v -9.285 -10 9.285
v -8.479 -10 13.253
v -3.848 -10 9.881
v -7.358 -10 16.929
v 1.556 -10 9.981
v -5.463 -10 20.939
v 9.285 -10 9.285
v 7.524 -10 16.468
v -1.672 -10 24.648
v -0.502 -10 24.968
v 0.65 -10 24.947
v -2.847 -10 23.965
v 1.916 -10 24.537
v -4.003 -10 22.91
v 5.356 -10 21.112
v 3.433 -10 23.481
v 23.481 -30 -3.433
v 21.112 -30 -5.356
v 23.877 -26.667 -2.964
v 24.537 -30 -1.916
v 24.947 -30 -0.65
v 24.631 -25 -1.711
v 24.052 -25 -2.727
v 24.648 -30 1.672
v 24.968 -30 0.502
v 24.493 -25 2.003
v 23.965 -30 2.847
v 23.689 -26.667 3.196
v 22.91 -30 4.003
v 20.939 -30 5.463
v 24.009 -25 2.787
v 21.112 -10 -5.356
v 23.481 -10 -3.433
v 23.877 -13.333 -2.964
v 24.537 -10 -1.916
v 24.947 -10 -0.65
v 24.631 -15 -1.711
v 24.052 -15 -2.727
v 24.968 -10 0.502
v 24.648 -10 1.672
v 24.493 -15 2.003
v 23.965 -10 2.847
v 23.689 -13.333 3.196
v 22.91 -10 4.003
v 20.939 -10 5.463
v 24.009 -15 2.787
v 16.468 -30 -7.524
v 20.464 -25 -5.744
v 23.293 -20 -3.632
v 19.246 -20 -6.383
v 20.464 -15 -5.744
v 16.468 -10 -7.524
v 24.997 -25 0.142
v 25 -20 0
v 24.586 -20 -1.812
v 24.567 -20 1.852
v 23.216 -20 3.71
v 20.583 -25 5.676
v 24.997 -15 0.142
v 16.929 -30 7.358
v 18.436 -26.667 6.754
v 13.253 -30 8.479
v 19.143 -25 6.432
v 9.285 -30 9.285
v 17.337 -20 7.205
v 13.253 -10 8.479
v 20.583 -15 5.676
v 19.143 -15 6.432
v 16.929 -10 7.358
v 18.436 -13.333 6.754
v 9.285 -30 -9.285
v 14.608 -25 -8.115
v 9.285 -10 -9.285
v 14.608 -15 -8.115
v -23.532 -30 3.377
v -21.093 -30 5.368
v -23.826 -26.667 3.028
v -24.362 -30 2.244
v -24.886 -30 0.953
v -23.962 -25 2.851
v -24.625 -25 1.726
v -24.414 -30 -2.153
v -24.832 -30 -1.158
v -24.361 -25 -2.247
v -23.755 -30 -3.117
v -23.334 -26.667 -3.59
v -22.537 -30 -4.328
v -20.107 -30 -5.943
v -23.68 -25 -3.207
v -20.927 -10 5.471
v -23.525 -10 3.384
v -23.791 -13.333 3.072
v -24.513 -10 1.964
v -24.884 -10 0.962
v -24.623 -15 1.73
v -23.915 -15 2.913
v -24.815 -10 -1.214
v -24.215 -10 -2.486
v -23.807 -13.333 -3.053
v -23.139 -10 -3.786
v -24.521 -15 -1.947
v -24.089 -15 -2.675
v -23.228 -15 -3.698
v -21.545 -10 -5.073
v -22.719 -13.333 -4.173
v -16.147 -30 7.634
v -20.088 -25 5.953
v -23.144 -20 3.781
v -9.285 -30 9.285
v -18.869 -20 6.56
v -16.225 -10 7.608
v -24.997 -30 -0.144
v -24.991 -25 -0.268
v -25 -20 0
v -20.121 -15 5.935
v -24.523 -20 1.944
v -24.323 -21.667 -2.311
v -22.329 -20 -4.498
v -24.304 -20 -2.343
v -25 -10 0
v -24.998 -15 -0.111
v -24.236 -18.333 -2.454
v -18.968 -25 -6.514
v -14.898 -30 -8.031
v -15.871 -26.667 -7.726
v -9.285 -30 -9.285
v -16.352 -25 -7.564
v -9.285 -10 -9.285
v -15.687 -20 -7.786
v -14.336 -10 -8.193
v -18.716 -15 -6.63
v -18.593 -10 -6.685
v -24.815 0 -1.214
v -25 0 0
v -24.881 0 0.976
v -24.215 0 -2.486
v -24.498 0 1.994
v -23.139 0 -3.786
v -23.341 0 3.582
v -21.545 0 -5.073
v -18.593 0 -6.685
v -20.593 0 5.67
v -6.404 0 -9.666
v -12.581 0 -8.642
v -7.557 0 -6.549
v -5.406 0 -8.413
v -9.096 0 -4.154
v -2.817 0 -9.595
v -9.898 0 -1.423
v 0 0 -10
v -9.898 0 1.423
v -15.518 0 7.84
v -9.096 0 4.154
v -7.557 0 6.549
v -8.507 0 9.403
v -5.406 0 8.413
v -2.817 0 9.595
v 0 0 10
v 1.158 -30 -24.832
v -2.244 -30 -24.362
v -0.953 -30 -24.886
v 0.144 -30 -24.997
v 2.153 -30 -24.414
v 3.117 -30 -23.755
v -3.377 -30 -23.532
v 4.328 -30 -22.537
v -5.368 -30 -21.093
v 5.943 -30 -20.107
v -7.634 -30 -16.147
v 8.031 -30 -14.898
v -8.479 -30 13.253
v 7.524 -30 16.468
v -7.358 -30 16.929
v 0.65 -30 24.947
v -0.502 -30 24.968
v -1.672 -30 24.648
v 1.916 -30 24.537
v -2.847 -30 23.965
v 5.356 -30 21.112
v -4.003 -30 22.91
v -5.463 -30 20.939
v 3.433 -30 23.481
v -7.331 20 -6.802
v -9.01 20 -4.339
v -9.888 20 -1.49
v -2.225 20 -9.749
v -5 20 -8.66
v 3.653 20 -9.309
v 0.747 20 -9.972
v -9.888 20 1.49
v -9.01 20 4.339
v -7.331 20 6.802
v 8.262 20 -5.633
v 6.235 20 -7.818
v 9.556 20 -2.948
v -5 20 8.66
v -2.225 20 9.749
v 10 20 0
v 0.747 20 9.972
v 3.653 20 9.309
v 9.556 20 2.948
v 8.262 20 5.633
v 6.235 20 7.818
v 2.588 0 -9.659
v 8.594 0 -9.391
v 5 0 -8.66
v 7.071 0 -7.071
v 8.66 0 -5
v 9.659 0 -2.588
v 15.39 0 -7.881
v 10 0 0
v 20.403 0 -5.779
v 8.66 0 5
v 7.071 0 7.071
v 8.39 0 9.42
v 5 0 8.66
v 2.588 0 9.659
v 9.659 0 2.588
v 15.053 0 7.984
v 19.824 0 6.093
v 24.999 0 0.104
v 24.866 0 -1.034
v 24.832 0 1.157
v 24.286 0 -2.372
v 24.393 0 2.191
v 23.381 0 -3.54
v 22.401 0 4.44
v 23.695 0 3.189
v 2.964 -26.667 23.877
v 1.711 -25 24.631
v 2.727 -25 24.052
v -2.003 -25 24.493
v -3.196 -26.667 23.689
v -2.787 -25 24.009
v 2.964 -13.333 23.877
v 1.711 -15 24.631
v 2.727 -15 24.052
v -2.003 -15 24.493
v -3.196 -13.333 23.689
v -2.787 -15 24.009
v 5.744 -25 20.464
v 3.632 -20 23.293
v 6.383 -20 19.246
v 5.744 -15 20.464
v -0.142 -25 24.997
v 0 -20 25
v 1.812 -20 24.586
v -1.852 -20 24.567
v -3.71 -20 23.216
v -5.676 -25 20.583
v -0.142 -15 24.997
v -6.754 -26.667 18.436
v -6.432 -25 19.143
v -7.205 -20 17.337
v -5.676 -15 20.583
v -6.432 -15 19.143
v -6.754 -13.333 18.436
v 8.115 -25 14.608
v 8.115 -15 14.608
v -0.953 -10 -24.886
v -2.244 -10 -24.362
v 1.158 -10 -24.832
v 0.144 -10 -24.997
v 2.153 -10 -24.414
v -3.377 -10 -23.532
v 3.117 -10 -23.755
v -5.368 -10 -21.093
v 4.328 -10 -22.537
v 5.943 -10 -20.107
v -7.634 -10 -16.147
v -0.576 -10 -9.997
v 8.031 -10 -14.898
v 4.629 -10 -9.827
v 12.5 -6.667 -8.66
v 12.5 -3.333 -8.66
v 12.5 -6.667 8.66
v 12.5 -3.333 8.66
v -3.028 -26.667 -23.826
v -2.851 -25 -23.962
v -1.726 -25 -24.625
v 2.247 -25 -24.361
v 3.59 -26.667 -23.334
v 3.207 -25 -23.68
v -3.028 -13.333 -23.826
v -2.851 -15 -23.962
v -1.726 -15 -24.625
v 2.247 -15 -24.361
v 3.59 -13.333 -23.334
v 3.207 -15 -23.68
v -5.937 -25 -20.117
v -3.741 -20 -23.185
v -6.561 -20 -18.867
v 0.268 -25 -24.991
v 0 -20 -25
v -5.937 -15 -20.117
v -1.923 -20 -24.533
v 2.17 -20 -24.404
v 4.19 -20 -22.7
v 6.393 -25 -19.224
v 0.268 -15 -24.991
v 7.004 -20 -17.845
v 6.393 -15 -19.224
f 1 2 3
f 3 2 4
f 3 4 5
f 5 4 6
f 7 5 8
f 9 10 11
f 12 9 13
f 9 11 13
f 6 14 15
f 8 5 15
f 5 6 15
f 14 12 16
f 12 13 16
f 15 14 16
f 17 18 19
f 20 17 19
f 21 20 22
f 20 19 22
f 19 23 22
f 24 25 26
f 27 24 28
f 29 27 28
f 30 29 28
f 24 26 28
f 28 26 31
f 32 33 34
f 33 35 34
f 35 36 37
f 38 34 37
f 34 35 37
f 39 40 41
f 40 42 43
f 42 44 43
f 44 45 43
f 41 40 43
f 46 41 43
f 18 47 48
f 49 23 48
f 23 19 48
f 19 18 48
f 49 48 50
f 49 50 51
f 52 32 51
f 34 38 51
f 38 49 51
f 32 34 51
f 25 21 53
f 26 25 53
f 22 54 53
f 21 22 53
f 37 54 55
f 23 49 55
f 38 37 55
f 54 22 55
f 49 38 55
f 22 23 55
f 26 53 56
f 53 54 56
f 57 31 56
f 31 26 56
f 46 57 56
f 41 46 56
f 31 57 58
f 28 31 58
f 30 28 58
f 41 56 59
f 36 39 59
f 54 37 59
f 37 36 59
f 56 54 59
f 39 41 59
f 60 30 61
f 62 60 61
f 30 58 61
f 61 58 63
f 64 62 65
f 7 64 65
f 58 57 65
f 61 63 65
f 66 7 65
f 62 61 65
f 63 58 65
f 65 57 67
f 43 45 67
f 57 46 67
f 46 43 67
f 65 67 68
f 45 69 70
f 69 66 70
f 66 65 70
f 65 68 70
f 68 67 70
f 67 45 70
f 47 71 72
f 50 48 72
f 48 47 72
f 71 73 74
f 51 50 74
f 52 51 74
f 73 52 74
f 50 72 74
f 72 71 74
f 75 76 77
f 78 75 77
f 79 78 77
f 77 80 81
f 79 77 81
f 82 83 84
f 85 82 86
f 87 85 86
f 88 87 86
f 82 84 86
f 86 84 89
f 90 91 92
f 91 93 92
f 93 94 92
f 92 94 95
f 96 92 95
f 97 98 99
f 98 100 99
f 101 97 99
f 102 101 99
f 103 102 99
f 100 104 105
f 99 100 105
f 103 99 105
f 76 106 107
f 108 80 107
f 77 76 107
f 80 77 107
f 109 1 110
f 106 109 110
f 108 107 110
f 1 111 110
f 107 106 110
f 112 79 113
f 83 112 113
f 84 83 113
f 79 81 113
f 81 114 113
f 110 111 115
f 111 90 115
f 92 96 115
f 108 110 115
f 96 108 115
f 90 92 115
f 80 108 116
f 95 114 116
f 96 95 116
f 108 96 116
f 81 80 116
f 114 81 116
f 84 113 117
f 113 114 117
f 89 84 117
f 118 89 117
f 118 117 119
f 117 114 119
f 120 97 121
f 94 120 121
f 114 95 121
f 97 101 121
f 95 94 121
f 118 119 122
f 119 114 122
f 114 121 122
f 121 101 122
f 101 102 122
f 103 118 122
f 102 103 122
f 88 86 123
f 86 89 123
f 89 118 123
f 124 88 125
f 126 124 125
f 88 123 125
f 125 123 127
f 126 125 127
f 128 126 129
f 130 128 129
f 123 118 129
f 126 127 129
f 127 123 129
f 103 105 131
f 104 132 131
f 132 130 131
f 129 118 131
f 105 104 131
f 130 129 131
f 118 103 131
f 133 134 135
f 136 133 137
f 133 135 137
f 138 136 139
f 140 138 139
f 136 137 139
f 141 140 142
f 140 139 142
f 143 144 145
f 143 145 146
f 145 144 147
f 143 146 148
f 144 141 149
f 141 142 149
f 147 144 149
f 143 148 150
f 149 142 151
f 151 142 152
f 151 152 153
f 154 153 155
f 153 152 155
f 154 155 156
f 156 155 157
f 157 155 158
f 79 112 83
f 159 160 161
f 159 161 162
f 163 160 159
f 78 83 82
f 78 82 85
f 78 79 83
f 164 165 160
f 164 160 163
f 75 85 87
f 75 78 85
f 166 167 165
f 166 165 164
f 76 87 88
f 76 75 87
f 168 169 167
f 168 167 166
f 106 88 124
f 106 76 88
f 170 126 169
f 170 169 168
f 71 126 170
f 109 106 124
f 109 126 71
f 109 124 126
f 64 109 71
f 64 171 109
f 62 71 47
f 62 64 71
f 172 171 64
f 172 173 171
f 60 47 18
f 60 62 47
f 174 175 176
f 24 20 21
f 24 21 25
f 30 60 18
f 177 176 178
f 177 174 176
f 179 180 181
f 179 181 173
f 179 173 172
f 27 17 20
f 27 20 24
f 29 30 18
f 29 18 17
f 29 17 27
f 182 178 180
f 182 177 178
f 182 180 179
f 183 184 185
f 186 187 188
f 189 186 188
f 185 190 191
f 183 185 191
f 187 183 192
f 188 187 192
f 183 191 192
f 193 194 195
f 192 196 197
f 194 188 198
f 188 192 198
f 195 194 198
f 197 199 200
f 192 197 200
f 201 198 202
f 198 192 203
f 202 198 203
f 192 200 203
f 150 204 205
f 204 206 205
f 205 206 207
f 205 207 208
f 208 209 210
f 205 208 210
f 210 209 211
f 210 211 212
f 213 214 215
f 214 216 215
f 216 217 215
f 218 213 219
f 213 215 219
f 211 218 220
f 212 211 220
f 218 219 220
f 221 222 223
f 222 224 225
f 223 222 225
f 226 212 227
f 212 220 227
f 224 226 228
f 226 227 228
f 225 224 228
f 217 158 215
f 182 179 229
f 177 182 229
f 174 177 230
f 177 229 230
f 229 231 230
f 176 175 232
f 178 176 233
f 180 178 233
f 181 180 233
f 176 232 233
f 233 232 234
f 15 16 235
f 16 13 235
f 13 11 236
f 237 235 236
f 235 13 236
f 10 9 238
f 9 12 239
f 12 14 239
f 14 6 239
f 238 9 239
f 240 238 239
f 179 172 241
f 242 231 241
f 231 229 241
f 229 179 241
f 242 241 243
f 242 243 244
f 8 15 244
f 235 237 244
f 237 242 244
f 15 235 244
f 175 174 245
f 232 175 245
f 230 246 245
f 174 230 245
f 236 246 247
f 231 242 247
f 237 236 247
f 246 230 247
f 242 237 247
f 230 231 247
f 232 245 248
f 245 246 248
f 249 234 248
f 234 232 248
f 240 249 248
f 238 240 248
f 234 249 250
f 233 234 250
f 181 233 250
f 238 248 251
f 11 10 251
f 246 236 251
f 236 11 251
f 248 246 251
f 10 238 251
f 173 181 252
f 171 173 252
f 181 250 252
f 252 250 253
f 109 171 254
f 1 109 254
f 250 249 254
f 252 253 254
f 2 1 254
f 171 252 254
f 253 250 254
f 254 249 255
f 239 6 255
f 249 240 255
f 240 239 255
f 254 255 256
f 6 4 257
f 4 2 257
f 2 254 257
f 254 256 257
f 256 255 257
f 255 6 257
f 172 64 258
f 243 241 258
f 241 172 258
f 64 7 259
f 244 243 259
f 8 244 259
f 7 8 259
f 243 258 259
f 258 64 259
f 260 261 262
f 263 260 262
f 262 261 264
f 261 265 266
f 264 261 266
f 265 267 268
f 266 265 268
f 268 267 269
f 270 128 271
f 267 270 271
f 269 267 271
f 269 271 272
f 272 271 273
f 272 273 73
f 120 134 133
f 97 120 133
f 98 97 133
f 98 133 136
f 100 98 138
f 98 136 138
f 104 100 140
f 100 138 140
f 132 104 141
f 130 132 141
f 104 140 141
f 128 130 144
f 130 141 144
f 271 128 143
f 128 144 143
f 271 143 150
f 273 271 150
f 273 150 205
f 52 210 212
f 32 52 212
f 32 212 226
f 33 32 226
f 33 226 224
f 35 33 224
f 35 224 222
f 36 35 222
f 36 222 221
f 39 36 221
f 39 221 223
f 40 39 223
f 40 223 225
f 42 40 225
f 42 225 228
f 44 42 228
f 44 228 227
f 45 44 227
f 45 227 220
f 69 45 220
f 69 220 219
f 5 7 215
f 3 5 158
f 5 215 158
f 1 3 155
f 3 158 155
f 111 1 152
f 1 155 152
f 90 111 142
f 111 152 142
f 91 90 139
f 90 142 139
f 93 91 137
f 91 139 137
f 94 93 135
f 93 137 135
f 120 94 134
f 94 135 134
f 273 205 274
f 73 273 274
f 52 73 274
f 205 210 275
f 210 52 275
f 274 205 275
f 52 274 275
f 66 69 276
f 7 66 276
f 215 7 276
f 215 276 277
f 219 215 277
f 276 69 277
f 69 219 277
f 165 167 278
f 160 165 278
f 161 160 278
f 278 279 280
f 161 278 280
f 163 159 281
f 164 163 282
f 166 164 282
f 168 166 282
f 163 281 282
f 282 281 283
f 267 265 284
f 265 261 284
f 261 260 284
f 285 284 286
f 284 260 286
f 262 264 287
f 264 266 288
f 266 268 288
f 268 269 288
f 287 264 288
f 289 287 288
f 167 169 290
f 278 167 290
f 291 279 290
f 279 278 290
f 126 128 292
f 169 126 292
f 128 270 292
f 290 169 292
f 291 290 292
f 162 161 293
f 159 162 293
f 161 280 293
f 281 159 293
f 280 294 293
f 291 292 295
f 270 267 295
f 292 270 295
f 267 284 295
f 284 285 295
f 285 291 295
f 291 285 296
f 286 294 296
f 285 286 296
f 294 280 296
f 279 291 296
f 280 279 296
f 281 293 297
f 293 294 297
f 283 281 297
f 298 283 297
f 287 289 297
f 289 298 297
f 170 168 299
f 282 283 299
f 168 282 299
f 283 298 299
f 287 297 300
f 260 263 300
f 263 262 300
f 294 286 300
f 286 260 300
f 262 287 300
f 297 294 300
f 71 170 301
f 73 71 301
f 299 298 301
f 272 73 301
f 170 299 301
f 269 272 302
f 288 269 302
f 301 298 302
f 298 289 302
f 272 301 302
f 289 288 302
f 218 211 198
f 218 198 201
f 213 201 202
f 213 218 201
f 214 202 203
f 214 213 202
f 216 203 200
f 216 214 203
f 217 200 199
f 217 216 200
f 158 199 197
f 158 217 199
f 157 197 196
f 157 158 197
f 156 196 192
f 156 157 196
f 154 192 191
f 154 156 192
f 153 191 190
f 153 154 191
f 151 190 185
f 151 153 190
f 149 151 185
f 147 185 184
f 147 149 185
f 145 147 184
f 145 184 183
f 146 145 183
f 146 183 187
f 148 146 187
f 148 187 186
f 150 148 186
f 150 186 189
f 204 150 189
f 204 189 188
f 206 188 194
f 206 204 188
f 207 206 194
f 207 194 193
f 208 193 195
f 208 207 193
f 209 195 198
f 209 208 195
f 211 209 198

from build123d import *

# Parameters (mm, degrees)
F1_DEPTH = 10
F2_R     = 10
F3_DEPTH = 20
F5_DEPTH = 20


with BuildPart() as f1:
    # F0 (on Front) → F1 (new body)
    with BuildSketch(Plane.XZ):
        with BuildLine():
            add(Edge.make_bspline(
                [(-25, 0), (-25, -17.3205080757), (12.5, -8.6602540378), (50, 0), (12.5, 8.6602540378), (-25, 17.3205080757), (-25, 0)],
                knots=[0, 0, 0, 2.0943951024, 2.0943951024, 4.1887902048, 4.1887902048, 6.2831853072, 6.2831853072, 6.2831853072], degree=2, weights=[1, 0.5, 1, 0.5, 1, 0.5, 1]))
        make_face()
    extrude(amount=F1_DEPTH)

    # F2 (on Front) → F3 (join)
    with BuildSketch(Plane.XZ):
        Circle(F2_R)
    extrude(amount=-F3_DEPTH)

    # F4 (on face) → F5 (join)
    with BuildSketch(Plane.XZ.offset(10)):
        with BuildLine():
            add(Edge.make_bspline(
                [(9.2847669089, -9.2847669089), (25, -6.7703296143), (25, 0)],
                knots=[5.0928953575, 5.0928953575, 5.0928953575, 6.2831853072, 6.2831853072, 6.2831853072], degree=2, weights=[1, 0.8280672305, 1]))
            add(Edge.make_bspline(
                [(25, 0), (25, 6.7703296143), (9.2847669089, 9.2847669089)],
                knots=[0, 0, 0, 1.1902899497, 1.1902899497, 1.1902899497], degree=2, weights=[1, 0.8280672305, 1]))
            add(Edge.make_bspline(
                [(9.2847669089, -9.2847669089), (10.7703296143, 0), (9.2847669089, 9.2847669089)],
                knots=[4.3318826033, 4.3318826033, 4.3318826033, 5.0928953575, 5.0928953575, 5.0928953575], degree=2, weights=[1, 0.9284766909, 1]))
        make_face()
        with BuildLine():
            add(Edge.make_bspline(
                [(9.2847669089, -9.2847669089), (10.7703296143, 0), (9.2847669089, 9.2847669089)],
                knots=[4.3318826033, 4.3318826033, 4.3318826033, 5.0928953575, 5.0928953575, 5.0928953575], degree=2, weights=[1, 0.9284766909, 1]))
            add(Edge.make_bspline(
                [(9.2847669089, 9.2847669089), (0, 10.7703296143), (-9.2847669089, 9.2847669089)],
                knots=[1.1902899497, 1.1902899497, 1.1902899497, 1.9513027039, 1.9513027039, 1.9513027039], degree=2, weights=[1, 0.9284766909, 1]))
            add(Edge.make_bspline(
                [(-9.2847669089, 9.2847669089), (-10.7703296143, 0), (-9.2847669089, -9.2847669089)],
                knots=[1.1902899497, 1.1902899497, 1.1902899497, 1.9513027039, 1.9513027039, 1.9513027039], degree=2, weights=[1, 0.9284766909, 1]))
            add(Edge.make_bspline(
                [(-9.2847669089, -9.2847669089), (0, -10.7703296143), (9.2847669089, -9.2847669089)],
                knots=[4.3318826033, 4.3318826033, 4.3318826033, 5.0928953575, 5.0928953575, 5.0928953575], degree=2, weights=[1, 0.9284766909, 1]))
        make_face()
        with BuildLine():
            add(Edge.make_bspline(
                [(9.2847669089, 9.2847669089), (0, 10.7703296143), (-9.2847669089, 9.2847669089)],
                knots=[1.1902899497, 1.1902899497, 1.1902899497, 1.9513027039, 1.9513027039, 1.9513027039], degree=2, weights=[1, 0.9284766909, 1]))
            add(Edge.make_bspline(
                [(9.2847669089, 9.2847669089), (6.7703296143, 25), (0, 25)],
                knots=[5.0928953575, 5.0928953575, 5.0928953575, 6.2831853072, 6.2831853072, 6.2831853072], degree=2, weights=[1, 0.8280672305, 1]))
            add(Edge.make_bspline(
                [(0, 25), (-6.7703296143, 25), (-9.2847669089, 9.2847669089)],
                knots=[0, 0, 0, 1.1902899497, 1.1902899497, 1.1902899497], degree=2, weights=[1, 0.8280672305, 1]))
        make_face()
        with BuildLine():
            add(Edge.make_bspline(
                [(-9.2847669089, -9.2847669089), (0, -67.3145600892), (9.2847669089, -9.2847669089)],
                knots=[1.9513027039, 1.9513027039, 1.9513027039, 4.3318826033, 4.3318826033, 4.3318826033], degree=2, weights=[1, 0.3713906764, 1]))
            add(Edge.make_bspline(
                [(-9.2847669089, -9.2847669089), (0, -10.7703296143), (9.2847669089, -9.2847669089)],
                knots=[4.3318826033, 4.3318826033, 4.3318826033, 5.0928953575, 5.0928953575, 5.0928953575], degree=2, weights=[1, 0.9284766909, 1]))
        make_face()
        with BuildLine():
            add(Edge.make_bspline(
                [(-9.2847669089, 9.2847669089), (-10.7703296143, 0), (-9.2847669089, -9.2847669089)],
                knots=[1.1902899497, 1.1902899497, 1.1902899497, 1.9513027039, 1.9513027039, 1.9513027039], degree=2, weights=[1, 0.9284766909, 1]))
            add(Edge.make_bspline(
                [(-9.2847669089, 9.2847669089), (-67.3145600892, 0), (-9.2847669089, -9.2847669089)],
                knots=[1.9513027039, 1.9513027039, 1.9513027039, 4.3318826033, 4.3318826033, 4.3318826033], degree=2, weights=[1, 0.3713906764, 1]))
        make_face()
    extrude(amount=F5_DEPTH)


solid = f1.part
